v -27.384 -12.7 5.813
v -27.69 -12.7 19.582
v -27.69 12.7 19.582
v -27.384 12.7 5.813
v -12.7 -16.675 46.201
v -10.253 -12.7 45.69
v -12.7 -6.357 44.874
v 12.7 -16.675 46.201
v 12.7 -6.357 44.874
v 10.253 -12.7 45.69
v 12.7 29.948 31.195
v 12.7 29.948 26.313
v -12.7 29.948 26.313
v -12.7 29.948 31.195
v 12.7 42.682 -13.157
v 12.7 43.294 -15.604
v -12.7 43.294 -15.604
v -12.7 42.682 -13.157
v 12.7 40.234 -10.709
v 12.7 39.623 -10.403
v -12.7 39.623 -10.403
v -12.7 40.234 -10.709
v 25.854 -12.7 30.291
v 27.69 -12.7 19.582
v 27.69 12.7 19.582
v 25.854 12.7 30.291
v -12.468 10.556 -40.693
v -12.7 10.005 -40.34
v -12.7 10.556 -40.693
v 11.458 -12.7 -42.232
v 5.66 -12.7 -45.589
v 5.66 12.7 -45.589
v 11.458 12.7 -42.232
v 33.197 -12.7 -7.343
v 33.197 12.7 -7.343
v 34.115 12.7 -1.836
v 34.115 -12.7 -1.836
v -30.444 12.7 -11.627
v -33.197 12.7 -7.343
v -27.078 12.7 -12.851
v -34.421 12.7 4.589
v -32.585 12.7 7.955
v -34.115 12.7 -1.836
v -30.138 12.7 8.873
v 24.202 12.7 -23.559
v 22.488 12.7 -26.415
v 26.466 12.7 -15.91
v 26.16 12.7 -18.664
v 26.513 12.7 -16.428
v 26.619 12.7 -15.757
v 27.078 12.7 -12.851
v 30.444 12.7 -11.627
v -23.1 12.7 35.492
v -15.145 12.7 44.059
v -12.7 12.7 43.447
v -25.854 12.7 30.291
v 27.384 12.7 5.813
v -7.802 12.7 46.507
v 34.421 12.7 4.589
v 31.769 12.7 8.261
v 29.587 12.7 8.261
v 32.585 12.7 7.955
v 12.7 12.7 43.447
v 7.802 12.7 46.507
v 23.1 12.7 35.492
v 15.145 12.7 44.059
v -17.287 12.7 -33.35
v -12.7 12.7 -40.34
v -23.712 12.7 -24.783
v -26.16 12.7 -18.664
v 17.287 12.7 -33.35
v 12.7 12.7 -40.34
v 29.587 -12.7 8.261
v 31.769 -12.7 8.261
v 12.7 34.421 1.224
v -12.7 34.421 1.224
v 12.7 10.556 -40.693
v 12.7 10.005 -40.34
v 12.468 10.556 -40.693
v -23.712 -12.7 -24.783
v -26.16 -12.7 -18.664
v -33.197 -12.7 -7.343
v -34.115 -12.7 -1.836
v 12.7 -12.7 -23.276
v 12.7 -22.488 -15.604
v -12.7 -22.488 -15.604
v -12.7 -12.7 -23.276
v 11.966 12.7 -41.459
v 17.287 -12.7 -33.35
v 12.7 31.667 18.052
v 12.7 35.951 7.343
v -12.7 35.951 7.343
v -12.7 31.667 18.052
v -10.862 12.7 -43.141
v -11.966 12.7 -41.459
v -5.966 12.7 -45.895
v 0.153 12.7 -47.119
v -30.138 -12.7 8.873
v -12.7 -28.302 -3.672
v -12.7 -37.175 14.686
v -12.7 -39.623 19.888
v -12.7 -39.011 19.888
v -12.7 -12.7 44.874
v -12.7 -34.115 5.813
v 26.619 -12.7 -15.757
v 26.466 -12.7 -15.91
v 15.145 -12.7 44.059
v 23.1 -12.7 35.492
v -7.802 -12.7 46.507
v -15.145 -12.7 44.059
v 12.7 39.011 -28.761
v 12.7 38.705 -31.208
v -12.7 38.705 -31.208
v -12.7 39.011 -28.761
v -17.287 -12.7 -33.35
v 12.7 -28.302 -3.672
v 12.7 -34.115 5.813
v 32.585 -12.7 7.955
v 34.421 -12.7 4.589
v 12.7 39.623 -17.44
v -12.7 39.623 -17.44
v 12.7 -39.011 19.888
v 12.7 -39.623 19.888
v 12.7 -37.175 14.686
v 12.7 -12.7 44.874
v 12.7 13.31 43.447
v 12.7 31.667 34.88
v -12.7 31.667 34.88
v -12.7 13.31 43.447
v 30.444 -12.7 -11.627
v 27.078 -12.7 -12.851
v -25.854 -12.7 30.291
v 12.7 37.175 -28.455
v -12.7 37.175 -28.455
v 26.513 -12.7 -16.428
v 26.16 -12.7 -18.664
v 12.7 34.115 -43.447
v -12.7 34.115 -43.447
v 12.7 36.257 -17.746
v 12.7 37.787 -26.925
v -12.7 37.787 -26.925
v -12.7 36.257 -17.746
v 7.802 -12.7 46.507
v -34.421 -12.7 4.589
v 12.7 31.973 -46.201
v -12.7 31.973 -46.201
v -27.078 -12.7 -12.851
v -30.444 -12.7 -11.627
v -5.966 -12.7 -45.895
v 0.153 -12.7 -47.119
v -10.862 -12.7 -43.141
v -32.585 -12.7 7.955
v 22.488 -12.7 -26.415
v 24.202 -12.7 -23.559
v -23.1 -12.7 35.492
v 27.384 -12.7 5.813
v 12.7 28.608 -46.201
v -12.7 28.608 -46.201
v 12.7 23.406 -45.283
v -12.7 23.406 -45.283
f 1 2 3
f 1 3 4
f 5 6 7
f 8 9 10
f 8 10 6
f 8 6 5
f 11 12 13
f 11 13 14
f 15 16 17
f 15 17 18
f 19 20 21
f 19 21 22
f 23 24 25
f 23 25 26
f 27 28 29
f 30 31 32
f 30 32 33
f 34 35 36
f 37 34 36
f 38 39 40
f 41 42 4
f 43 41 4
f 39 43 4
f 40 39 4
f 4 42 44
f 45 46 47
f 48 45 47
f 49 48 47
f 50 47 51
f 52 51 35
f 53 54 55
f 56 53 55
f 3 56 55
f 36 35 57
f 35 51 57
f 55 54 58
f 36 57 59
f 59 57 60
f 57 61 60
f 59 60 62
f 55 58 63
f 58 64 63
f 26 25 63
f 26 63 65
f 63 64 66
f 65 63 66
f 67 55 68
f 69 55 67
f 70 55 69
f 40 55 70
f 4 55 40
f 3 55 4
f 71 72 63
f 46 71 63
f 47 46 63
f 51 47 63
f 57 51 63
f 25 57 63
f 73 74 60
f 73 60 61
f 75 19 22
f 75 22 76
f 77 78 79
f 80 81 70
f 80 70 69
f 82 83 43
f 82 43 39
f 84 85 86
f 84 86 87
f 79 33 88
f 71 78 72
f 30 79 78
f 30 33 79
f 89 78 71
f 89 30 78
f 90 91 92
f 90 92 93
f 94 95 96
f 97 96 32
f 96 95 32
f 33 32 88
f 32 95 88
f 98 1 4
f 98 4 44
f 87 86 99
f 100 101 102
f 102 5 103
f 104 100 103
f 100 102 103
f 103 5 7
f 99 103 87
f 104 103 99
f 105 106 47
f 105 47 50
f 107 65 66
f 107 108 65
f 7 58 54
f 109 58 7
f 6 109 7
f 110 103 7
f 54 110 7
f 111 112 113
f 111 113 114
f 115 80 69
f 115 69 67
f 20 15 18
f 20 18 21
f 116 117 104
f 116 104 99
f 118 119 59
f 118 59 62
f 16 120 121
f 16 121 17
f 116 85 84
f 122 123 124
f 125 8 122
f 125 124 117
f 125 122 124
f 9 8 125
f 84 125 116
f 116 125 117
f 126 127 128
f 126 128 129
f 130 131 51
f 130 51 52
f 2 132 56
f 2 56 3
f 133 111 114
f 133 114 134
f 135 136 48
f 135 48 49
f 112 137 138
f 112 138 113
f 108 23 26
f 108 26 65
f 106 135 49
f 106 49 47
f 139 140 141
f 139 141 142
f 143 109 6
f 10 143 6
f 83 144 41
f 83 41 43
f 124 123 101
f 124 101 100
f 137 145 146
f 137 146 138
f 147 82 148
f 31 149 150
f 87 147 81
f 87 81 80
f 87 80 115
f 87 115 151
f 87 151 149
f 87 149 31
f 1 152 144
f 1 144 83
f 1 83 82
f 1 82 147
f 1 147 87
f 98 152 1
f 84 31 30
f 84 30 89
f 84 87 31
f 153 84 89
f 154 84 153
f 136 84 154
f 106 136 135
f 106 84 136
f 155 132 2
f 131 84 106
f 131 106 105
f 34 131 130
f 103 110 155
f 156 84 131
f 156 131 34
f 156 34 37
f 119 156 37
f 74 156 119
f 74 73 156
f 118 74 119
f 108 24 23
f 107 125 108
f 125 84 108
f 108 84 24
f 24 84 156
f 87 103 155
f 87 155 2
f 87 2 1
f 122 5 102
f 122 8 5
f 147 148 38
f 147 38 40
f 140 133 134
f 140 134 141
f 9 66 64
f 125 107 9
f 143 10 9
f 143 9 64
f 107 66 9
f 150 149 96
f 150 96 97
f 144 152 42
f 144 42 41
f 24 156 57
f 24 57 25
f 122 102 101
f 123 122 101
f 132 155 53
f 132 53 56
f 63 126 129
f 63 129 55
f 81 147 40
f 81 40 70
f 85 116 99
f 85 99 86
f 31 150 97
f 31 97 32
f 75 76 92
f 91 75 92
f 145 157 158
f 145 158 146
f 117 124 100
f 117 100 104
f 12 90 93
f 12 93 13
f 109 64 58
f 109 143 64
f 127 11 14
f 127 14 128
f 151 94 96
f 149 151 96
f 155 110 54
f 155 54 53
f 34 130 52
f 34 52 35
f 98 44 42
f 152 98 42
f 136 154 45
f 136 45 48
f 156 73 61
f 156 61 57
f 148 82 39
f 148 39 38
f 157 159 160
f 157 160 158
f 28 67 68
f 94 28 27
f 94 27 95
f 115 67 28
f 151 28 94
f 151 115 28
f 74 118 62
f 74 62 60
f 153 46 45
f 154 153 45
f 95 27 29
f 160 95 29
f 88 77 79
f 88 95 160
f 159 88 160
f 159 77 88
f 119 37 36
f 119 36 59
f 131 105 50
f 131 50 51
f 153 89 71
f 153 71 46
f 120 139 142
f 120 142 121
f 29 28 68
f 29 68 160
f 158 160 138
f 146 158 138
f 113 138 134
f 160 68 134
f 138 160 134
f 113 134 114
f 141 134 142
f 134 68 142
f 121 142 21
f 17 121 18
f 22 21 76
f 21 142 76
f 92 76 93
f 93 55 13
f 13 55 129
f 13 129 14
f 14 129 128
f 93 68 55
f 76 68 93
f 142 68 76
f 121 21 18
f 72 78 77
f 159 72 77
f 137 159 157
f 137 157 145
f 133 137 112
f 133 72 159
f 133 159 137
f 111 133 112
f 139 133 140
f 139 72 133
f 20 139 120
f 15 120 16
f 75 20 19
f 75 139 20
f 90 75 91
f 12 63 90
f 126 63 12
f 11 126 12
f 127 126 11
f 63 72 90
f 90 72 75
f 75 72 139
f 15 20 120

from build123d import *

# Parameters (mm, degrees)
F0_W     = 42.5292160362
F0_H     = 54.7678396106
F1_DEPTH = 25.4
F5_DEPTH = 12.7
F6_DEPTH = 12.7


with BuildPart() as f1:
    # F0 (on Right) → F1 (new body)
    with BuildSketch(Plane.YZ):
        with Locations((0.3059664741, 8.7200179696)):
            Rectangle(F0_W, F0_H)
    extrude(amount=F1_DEPTH)


with BuildPart() as f5:
    # F4 (on Front) → F5 (new body, symmetric)
    with BuildSketch(Plane.XZ):
        Polygon((7.8021222726, 46.5067662299), (-7.8021222726, 46.5067662299), (-15.1452962309, 44.0590418875), (-23.1004003435, 35.4920066893), (-25.8540920913, 30.2905943245), (-27.6898853481, 19.5817966014), (-27.3839198053, 5.8133457787), (-30.1376096904, 8.8730016723), (-32.5853340328, 7.9551050439), (-34.4211272895, 4.5894836076), (-34.1151617467, -1.8357934896), (-33.1972651184, -7.3431739584), (-30.4435752332, -11.6266915575), (-27.0779542625, -12.85055466), (-26.1600576341, -18.6639018357), (-23.7123332918, -24.7832108289), (-17.2870550305, -33.3502478898), (-10.8617777005, -43.1411489844), (-5.9663290158, -45.8948388696), (0.1529839792, -47.1187010407), (5.6603644043, -45.5888696015), (11.4582879852, -42.2321807174), (17.2870550305, -33.3502478898), (22.4884822373, -26.4150121165), (24.2018731435, -23.5593615721), (26.1600576341, -18.6639018357), (26.5130960305, -16.4279912753), (26.4660250396, -15.9102100879), (26.6190057487, -15.7572295118), (27.0779542625, -12.85055466), (30.4435752332, -11.6266915575), (33.1972651184, -7.3431739584), (34.1151617467, -1.8357934896), (34.4211272895, 4.5894836076), (32.5853340328, 7.9551050439), (31.7694234351, 8.2610715181), (29.5868726354, 8.2610715181), (27.3839198053, 5.8133457787), (27.6898853481, 19.5817966014), (25.8540920913, 30.2905943245), (23.1004003435, 35.4920066893), (15.1452962309, 44.0590418875), align=None)
    extrude(amount=F5_DEPTH, both=True)

    # F3 (on Right) → F6 (join, symmetric)
    with BuildSketch(Plane.YZ):
        Polygon((-16.6751239449, 46.2008044124), (-39.0106141567, 19.8877640069), (-39.6225452423, 19.8877640069), (-37.1748209, 14.6863479167), (-34.1151617467, 5.8133457787), (-28.3018164337, -3.6715869792), (-22.4884711206, -15.6042445451), (-11.1677432433, -24.4772471488), (-1.3768438948, -33.0442860723), (10.555813089, -40.6934246421), (23.4063696116, -45.282907784), (28.6077857018, -46.2008044124), (31.9734066725, -46.2008044124), (34.115165472, -43.4471108019), (38.7046486139, -31.2084890902), (39.0106141567, -28.7607647479), (37.1748209, -28.4547992051), (37.7867519855, -26.9249714911), (36.2569242716, -17.7460033447), (39.6225452423, -17.4400378019), (43.2941317558, -15.6042445451), (42.6822006702, -13.1565211341), (39.6225452423, -10.4028293863), (40.2344763279, -10.7087958604), (34.4211310148, 1.2238622876), (35.9509587288, 7.3431739584), (31.6674411297, 18.0519688874), (29.9477812825, 26.3130422682), (29.9477812825, 31.1950890951), (31.6674411297, 34.8800756037), (13.3095029742, 43.4471108019), (4.7424673103, 43.4471108019), align=None)
    extrude(amount=F6_DEPTH, both=True)


solid = f5.part
